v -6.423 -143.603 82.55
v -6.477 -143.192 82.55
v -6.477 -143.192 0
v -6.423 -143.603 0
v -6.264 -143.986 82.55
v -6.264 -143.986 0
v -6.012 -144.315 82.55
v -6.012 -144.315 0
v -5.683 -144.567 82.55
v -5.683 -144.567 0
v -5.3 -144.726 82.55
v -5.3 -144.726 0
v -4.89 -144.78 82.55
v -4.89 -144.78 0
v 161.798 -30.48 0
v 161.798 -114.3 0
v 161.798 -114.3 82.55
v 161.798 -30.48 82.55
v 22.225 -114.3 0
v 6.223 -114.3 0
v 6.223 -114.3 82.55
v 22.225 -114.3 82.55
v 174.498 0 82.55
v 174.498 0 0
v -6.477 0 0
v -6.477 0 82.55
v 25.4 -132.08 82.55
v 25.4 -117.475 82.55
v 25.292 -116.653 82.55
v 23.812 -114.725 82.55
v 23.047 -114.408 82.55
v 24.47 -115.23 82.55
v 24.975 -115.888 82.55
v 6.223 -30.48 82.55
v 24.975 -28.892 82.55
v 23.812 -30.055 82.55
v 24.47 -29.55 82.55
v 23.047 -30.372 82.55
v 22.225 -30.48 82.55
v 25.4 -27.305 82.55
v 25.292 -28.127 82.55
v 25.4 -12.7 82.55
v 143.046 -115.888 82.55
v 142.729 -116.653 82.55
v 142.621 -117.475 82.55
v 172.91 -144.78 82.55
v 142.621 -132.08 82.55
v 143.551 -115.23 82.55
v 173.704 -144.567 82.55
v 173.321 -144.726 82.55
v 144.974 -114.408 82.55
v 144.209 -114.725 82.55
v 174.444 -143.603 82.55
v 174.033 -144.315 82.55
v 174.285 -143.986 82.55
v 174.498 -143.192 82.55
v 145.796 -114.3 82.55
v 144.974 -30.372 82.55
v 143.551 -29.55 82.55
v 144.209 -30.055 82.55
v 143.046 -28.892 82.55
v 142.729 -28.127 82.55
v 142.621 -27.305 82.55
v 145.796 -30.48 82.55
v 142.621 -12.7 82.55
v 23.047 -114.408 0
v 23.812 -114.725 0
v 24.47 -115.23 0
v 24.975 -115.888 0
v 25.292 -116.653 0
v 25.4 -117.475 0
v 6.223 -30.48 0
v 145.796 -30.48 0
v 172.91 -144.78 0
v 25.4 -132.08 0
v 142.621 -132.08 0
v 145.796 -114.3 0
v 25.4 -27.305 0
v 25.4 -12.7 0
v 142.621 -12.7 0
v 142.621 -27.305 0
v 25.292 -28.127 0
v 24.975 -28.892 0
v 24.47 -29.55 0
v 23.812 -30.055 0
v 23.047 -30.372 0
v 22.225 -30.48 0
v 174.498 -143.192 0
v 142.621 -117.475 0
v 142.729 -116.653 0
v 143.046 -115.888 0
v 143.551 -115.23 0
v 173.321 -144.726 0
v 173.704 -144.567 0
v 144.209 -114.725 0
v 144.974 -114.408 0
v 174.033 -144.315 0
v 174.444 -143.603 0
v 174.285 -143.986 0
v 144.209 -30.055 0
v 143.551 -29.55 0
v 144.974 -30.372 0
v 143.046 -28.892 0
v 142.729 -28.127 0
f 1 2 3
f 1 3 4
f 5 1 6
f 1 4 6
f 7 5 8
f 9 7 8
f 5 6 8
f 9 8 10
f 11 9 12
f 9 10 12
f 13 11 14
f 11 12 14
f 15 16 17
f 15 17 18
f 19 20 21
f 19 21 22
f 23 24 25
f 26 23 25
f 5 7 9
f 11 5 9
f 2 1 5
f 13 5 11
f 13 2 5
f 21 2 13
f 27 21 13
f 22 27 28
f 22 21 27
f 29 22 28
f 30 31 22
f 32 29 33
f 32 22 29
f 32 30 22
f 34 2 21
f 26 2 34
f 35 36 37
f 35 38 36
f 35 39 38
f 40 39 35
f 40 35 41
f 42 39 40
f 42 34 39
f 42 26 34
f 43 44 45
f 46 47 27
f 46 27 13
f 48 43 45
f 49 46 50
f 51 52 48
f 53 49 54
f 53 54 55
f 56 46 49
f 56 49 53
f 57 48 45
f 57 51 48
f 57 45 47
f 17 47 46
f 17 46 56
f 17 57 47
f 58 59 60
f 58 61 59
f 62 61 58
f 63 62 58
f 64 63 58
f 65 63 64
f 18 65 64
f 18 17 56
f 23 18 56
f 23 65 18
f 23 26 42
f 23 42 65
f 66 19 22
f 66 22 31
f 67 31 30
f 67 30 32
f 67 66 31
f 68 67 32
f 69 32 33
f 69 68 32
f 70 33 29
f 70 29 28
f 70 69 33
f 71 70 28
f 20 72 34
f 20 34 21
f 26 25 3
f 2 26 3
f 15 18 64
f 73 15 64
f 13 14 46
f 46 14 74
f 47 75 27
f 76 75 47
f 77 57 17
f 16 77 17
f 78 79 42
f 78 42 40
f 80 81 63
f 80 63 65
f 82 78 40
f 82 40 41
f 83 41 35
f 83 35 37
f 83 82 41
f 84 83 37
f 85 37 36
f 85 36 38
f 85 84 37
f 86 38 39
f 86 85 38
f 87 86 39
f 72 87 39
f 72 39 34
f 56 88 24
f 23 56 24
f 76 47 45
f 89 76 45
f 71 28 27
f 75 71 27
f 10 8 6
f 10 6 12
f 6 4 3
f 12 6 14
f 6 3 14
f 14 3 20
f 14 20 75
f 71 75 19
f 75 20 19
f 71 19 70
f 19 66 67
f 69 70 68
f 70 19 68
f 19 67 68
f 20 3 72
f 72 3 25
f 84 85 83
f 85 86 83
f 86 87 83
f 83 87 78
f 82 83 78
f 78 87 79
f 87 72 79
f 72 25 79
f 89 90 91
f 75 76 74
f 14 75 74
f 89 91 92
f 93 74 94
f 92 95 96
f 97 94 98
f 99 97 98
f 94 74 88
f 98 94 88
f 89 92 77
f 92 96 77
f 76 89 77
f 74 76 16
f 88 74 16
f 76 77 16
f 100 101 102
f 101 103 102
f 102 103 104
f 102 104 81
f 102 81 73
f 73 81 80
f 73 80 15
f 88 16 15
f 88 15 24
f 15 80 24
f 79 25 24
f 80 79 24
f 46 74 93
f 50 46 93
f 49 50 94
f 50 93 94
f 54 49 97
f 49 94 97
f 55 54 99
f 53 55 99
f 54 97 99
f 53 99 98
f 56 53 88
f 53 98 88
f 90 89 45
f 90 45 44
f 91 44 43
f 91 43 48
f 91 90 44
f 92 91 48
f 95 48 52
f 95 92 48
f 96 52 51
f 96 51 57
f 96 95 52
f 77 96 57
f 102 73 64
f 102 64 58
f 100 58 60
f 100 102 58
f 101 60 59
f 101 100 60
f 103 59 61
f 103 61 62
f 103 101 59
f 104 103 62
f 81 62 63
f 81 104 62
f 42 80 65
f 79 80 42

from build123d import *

# Parameters (mm, degrees)
BOSS_EXTRUDE1_DEPTH = 82.55


with BuildPart() as part:
    # Sketch1 → Boss-Extrude1 (new body)
    with BuildSketch(Plane.XY):
        with BuildLine():
            Line((174.498, 0), (-6.477, 0))
            Line((-6.477, 0), (-6.477, -143.1925))
            ThreePointArc((-6.477, -143.1925), (-6.012032015, -144.315032015), (-4.8895, -144.78))
            Line((-4.8895, -144.78), (172.9105, -144.78))
            ThreePointArc((172.9105, -144.78), (174.033032015, -144.315032015), (174.498, -143.1925))
            Line((174.498, -143.1925), (174.498, 0))
        make_face()
        with BuildLine():
            Line((6.223, -114.3), (22.225, -114.3))
            ThreePointArc((22.225, -114.3), (24.47006403, -115.22993597), (25.4, -117.475))
            Line((25.4, -117.475), (25.4, -132.08))
            Line((25.4, -132.08), (142.621, -132.08))
            Line((142.621, -132.08), (142.621, -117.475))
            ThreePointArc((142.621, -117.475), (143.55093597, -115.22993597), (145.796, -114.3))
            Line((145.796, -114.3), (161.798, -114.3))
            Line((161.798, -114.3), (161.798, -30.48))
            Line((161.798, -30.48), (145.796, -30.48))
            ThreePointArc((145.796, -30.48), (143.55093597, -29.55006403), (142.621, -27.305))
            Line((142.621, -27.305), (142.621, -12.7))
            Line((142.621, -12.7), (25.4, -12.7))
            Line((25.4, -12.7), (25.4, -27.305))
            ThreePointArc((25.4, -27.305), (24.47006403, -29.55006403), (22.225, -30.48))
            Line((22.225, -30.48), (6.223, -30.48))
            Line((6.223, -30.48), (6.223, -114.3))
        make_face(mode=Mode.SUBTRACT)
    extrude(amount=BOSS_EXTRUDE1_DEPTH)


solid = part.part
